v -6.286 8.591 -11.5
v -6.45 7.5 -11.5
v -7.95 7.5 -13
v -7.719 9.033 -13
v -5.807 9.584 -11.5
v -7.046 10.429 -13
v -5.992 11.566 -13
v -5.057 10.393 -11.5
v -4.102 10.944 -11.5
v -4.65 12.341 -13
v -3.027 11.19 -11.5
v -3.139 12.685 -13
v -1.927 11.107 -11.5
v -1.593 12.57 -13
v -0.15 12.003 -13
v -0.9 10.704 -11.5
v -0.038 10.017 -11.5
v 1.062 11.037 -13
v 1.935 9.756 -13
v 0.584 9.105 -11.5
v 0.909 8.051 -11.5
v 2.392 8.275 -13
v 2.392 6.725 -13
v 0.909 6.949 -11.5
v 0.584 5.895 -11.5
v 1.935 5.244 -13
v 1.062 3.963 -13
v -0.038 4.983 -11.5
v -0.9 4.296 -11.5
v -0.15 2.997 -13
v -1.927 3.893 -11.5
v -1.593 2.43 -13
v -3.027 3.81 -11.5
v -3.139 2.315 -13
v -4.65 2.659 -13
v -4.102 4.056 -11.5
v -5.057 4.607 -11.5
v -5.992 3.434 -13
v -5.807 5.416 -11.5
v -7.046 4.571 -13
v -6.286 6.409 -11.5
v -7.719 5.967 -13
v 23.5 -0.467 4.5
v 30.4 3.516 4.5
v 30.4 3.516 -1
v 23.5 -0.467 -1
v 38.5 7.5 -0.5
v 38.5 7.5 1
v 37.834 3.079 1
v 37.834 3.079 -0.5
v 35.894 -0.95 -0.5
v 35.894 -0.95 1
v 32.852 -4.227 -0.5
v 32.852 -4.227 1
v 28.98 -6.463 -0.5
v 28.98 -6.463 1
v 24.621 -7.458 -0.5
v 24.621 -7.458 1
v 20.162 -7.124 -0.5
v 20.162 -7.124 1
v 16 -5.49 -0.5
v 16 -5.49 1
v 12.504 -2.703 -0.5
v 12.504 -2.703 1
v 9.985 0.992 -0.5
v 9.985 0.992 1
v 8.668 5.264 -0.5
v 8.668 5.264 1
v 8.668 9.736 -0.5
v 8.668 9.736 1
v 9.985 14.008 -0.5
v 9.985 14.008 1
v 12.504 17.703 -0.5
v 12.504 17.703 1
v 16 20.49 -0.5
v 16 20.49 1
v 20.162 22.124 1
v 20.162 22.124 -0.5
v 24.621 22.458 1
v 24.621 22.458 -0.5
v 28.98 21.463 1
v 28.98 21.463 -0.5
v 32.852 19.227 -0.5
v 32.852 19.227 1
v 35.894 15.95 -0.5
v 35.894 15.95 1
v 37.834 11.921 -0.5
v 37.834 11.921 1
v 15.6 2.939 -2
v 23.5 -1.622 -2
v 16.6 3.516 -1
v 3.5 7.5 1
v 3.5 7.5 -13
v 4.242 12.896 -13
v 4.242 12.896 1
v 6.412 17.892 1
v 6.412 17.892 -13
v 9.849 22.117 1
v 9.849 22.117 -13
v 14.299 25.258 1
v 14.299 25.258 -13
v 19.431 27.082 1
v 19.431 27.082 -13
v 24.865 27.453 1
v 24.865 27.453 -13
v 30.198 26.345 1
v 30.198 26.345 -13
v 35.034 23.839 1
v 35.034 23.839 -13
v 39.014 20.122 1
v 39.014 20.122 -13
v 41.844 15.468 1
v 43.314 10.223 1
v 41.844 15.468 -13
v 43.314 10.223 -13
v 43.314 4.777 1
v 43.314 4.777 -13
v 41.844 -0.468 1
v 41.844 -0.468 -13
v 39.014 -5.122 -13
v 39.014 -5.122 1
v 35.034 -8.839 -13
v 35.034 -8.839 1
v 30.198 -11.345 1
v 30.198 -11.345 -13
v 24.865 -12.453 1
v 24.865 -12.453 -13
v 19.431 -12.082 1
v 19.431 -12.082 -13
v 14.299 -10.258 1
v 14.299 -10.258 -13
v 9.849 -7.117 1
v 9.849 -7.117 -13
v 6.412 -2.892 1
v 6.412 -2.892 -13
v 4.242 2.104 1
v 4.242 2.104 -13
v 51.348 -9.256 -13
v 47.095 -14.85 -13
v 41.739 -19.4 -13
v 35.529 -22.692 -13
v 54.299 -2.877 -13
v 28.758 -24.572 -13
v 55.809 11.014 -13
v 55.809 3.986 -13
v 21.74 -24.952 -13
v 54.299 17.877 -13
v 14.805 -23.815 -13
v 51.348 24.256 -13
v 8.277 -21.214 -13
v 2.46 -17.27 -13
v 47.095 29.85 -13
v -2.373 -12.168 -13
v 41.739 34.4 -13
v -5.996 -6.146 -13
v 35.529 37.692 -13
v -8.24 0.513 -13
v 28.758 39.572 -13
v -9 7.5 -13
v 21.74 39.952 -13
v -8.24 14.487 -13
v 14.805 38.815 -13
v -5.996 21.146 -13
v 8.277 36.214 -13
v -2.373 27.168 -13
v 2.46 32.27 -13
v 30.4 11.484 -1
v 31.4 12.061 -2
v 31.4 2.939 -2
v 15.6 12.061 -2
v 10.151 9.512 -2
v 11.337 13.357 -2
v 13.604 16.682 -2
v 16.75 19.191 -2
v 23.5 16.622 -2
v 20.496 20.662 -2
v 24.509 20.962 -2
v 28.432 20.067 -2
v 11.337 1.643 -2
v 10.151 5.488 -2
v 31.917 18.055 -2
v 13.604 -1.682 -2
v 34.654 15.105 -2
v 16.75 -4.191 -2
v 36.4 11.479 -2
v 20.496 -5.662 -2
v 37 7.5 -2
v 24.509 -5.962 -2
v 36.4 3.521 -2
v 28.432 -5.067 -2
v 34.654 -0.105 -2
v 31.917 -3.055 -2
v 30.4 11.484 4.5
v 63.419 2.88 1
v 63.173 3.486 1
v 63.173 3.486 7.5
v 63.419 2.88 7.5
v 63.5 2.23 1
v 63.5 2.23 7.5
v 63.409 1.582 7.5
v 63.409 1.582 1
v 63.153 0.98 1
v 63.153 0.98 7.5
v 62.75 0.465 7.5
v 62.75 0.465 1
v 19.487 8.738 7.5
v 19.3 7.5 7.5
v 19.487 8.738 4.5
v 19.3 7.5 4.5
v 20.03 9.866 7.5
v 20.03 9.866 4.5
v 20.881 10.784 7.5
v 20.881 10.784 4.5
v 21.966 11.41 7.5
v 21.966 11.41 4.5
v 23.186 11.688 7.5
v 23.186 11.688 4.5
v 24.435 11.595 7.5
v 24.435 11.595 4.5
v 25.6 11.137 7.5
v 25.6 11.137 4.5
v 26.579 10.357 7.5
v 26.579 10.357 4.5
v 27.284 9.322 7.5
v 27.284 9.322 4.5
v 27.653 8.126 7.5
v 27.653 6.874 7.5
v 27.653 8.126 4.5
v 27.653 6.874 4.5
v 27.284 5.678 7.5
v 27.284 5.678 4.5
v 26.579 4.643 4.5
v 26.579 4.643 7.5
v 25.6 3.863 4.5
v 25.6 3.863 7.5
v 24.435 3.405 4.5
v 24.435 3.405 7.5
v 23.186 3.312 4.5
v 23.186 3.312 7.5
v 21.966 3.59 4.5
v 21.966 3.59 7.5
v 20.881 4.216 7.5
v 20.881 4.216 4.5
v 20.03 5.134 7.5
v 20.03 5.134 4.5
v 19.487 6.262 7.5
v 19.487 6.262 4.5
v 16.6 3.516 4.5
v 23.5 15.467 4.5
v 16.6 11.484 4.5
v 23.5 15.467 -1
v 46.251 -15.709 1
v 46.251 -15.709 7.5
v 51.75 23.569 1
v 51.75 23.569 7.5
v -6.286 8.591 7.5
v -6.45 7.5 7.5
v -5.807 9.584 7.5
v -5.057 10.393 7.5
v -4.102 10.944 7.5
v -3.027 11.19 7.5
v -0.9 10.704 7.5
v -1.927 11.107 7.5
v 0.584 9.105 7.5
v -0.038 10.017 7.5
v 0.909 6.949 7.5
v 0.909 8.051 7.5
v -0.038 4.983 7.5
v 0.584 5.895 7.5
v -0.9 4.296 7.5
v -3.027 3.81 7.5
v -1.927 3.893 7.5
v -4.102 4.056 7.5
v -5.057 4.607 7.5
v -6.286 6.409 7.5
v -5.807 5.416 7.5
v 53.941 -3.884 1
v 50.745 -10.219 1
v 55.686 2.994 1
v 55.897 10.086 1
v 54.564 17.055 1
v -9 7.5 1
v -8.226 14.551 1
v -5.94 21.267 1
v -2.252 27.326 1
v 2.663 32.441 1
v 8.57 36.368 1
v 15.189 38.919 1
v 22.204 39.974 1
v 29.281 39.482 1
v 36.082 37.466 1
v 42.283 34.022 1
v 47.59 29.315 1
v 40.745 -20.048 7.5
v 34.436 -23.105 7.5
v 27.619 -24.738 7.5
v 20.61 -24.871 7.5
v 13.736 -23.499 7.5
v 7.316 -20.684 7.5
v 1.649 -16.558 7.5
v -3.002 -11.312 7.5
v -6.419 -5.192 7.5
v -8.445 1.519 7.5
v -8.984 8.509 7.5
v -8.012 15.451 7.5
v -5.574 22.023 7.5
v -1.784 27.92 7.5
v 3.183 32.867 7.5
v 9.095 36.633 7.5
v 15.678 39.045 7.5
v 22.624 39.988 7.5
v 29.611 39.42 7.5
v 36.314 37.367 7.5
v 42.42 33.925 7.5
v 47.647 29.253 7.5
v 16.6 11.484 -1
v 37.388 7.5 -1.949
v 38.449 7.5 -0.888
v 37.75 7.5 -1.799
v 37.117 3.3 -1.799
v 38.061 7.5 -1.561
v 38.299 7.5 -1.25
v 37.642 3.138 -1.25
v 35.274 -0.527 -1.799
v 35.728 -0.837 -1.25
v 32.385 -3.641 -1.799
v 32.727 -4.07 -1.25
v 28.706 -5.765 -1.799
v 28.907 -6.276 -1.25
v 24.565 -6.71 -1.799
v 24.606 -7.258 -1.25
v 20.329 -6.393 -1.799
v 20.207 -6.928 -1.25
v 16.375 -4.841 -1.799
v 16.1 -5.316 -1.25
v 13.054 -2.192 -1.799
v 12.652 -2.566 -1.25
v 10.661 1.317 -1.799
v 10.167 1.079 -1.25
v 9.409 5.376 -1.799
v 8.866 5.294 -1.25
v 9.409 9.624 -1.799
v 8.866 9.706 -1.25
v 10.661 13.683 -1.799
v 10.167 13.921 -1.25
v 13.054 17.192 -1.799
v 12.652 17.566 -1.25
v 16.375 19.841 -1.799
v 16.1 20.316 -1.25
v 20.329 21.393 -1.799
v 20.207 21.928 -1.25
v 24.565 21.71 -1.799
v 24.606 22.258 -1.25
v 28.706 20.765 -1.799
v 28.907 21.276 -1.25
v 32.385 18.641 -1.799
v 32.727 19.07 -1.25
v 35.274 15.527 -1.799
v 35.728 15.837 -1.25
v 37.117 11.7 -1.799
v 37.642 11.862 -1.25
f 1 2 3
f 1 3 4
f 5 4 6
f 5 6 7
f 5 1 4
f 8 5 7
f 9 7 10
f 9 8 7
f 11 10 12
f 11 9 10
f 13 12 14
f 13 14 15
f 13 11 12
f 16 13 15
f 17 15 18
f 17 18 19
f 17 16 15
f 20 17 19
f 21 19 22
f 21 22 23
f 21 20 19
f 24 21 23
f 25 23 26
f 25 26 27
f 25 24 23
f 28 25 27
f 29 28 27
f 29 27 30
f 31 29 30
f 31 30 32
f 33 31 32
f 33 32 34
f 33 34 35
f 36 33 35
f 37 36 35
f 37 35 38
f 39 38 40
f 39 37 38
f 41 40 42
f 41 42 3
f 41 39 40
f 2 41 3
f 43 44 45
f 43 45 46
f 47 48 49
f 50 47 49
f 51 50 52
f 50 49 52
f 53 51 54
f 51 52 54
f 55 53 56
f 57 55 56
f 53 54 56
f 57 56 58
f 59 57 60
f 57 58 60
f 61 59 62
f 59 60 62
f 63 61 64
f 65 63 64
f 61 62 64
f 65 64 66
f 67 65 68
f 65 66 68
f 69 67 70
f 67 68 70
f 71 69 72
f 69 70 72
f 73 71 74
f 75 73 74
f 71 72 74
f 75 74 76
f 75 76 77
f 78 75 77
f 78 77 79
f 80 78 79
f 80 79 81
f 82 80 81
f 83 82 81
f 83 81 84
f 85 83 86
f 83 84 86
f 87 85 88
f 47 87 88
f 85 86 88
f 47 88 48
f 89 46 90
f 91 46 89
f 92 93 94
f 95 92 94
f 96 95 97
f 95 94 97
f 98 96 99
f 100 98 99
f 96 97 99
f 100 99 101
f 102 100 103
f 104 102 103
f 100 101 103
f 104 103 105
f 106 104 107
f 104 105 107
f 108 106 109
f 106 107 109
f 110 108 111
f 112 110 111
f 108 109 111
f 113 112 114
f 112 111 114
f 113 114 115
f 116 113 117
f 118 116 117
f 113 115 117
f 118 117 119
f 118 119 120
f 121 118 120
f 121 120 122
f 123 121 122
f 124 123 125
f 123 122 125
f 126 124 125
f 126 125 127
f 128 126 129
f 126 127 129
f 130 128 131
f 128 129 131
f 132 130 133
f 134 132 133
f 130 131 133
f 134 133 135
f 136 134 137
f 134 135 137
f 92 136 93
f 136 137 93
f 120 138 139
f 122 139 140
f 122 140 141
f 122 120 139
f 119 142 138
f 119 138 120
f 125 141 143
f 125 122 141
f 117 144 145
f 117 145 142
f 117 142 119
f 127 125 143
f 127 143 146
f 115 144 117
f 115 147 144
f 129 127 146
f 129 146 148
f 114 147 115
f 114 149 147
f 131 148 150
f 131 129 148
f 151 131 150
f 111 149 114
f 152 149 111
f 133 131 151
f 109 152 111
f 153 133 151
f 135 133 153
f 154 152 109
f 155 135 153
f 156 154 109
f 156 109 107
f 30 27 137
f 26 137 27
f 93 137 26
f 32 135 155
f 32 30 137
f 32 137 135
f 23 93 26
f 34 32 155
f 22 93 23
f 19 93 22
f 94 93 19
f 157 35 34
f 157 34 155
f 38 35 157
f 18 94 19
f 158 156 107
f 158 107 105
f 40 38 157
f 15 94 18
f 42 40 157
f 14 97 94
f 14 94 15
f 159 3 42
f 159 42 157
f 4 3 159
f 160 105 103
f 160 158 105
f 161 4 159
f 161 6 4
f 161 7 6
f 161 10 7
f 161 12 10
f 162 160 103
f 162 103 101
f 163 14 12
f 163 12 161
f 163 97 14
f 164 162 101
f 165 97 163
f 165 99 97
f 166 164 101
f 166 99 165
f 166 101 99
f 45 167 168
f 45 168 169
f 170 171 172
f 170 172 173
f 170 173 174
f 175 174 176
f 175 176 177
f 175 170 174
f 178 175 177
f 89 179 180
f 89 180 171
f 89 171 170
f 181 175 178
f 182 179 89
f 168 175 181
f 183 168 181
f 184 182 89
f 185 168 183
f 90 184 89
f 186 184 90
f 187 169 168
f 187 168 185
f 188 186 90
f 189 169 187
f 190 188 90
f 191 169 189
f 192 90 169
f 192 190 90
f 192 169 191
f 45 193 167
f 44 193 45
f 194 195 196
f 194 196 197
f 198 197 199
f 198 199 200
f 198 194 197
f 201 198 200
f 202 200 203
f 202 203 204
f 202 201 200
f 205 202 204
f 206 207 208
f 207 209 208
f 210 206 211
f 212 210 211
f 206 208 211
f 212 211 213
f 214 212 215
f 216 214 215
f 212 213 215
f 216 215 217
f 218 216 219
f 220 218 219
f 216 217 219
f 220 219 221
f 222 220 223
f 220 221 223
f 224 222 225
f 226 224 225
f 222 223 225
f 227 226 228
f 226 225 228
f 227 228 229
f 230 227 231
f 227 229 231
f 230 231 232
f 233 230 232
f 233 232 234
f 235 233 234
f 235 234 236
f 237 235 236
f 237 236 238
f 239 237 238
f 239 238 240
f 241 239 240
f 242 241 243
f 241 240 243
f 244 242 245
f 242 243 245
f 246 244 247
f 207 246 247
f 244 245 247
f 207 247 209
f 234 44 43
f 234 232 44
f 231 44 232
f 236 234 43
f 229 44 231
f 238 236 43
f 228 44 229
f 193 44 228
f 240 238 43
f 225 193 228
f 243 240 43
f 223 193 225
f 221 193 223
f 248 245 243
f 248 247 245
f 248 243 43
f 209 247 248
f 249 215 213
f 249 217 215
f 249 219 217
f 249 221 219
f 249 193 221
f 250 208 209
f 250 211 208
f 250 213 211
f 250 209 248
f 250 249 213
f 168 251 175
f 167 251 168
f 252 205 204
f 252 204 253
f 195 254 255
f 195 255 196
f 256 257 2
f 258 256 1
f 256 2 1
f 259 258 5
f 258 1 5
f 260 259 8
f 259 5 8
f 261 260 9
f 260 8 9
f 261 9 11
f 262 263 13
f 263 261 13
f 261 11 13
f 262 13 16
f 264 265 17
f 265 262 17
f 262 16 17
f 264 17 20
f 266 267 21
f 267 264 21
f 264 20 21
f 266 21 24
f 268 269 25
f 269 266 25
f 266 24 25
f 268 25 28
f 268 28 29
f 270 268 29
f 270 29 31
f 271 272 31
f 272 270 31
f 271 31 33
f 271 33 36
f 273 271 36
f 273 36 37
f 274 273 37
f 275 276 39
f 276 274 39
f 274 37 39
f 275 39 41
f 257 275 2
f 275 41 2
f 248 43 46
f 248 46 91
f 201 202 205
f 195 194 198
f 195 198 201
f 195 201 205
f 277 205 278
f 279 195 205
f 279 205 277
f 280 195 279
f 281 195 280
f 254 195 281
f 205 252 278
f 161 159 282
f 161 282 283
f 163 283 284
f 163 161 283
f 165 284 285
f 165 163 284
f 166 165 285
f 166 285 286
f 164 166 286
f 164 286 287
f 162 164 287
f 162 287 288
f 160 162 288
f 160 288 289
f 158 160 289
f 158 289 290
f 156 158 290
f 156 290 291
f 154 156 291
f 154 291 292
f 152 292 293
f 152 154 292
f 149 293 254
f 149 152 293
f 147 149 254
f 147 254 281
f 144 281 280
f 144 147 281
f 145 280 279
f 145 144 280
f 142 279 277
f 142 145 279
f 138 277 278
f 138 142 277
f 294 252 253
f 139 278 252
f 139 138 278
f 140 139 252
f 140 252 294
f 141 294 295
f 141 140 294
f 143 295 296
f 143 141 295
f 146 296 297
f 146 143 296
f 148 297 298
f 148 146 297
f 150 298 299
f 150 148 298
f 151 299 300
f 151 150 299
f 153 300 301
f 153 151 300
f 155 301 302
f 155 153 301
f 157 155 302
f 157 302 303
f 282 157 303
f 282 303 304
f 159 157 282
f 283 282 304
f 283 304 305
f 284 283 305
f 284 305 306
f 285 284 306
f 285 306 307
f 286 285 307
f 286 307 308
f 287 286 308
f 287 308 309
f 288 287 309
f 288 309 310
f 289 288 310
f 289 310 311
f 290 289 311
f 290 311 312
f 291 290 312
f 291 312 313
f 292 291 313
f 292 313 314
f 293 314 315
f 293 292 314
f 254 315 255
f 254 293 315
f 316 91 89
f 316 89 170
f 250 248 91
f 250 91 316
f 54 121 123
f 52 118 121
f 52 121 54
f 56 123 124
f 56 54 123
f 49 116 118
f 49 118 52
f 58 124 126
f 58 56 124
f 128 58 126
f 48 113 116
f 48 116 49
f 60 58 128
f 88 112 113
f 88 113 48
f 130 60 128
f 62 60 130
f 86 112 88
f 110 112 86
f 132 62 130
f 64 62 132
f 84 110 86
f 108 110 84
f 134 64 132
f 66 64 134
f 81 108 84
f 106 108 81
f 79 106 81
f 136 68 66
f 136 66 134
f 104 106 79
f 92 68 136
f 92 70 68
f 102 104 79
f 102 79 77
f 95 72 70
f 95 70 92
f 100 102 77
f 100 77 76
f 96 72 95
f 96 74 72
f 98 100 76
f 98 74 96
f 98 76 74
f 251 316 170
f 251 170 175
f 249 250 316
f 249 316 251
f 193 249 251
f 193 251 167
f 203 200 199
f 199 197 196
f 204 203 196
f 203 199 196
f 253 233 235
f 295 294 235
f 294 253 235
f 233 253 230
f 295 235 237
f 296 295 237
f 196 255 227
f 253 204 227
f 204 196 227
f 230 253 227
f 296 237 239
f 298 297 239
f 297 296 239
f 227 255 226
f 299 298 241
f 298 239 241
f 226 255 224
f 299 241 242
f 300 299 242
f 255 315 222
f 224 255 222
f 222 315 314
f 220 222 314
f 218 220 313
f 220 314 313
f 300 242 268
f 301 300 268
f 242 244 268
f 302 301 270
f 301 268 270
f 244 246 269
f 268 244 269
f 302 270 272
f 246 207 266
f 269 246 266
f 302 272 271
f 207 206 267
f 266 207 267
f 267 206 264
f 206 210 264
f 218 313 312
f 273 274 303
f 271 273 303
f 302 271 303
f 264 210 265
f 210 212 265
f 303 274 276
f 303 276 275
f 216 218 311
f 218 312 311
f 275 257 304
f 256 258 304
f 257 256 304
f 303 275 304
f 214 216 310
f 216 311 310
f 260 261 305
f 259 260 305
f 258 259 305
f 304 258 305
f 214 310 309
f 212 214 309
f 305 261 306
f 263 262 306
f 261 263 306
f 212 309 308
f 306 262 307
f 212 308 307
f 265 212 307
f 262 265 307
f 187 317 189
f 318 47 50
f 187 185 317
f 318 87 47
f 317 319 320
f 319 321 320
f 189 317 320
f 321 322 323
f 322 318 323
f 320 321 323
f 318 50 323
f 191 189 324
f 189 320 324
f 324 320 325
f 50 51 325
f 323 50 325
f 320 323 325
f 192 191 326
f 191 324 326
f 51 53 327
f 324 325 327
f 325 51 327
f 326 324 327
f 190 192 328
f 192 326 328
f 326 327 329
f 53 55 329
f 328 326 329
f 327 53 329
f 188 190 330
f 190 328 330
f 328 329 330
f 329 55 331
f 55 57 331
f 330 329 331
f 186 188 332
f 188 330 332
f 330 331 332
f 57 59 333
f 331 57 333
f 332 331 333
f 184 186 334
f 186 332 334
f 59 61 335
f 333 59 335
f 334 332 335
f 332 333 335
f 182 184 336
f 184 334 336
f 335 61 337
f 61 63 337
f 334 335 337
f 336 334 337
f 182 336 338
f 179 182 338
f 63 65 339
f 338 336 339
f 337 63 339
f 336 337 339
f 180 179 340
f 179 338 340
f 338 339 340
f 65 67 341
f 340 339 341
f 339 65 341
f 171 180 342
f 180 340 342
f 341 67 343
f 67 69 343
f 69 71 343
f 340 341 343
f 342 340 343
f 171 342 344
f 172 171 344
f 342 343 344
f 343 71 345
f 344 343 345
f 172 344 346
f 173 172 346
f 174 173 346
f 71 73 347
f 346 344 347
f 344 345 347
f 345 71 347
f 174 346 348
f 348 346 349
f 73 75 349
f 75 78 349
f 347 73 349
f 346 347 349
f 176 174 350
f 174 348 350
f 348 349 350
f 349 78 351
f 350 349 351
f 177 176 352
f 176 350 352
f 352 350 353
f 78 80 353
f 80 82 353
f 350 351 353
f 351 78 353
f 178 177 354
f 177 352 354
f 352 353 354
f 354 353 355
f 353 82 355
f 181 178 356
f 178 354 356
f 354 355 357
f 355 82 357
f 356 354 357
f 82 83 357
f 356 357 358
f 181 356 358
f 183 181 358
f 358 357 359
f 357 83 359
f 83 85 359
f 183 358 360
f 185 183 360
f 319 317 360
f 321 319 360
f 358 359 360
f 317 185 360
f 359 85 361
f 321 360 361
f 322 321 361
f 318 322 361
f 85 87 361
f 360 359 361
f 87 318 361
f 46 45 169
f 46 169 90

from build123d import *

# Parameters (mm, degrees)
SKETCH2_R               = 32.5
BOSS_EXTRUDE1_DEPTH     = 6
SKETCH3_R               = 32.5
BOSS_EXTRUDE2_DEPTH     = 2
CHAMFER1_SIZE           = 2
CUT_EXTRUDE1_DEPTH      = 6.5
SKETCH5_R               = 4.2
CUT_EXTRUDE2_DEPTH      = 70.12488698
CUT_EXTRUDE3_DEPTH      = 70.079664157
SKETCH8_R               = 15
BOSS_EXTRUDE3_DEPTH     = 3
BOSS_EXTRUDE4_START     = 3
SKETCH9_R               = 4.2
BOSS_EXTRUDE4_DEPTH     = 3
CUT_EXTRUDE5_START      = -3
SKETCH10_R              = 32.5
CUT_EXTRUDE5_DEPTH      = 3
FILLET1_R               = 1.5
SKETCH11_R              = 32.5
BOSS_EXTRUDE5_DEPTH     = 1.5
SKETCH12_R              = 4.2
CUT_EXTRUDE6_DEPTH      = 70.282032303
CHAMFER2_SIZE           = 1
BOSS_EXTRUDE6_DEPTH     = 6.5
BOSS_EXTRUDE8_START     = -6.5
BOSS_EXTRUDE8_DEPTH     = 6.5
BOSS_EXTRUDE10_START    = 14
SKETCH16_R              = 32.5
SKETCH16_R_2            = 20
SKETCH16_R_3            = 3.7
BOSS_EXTRUDE10_DEPTH    = 14
CHAMFER3_SIZE           = 1.5
CUT_EXTRUDE7_DEPTH      = 77.342976101
CUT_EXTRUDE7_DEPTH_BACK = 77.342976101
SKETCH17_R              = 3.7


with BuildPart() as part:
    # Sketch2 → Boss-Extrude1 (new body)
    with BuildSketch(Plane.XY.offset(1)):
        with Locations((23.5, 7.5)):
            Circle(SKETCH2_R)
        with BuildLine():
            Line((-3.5, 0), (-3.5, 15))
            ThreePointArc((-3.5, 15), (0, 18.5), (3.5, 15))
            Line((3.5, 15), (3.5, 0))
            ThreePointArc((3.5, 0), (0, -3.5), (-3.5, 0))
        make_face(mode=Mode.SUBTRACT)
    extrude(amount=BOSS_EXTRUDE1_DEPTH)

    # Sketch3 → Boss-Extrude2 (add)
    with BuildSketch(Plane.XY.offset(7)):
        with Locations((23.5, 7.5)):
            Circle(SKETCH3_R)
    extrude(amount=BOSS_EXTRUDE2_DEPTH)

    # Chamfer1
    chamfer1_edges = [part.edges().sort_by_distance(p)[0] for p in [
        (-3.5, 7.5, 1),
        (0, -3.5, 1),
        (3.5, 7.5, 1),
        (0, 18.5, 1),
    ]]
    chamfer(chamfer1_edges, length=CHAMFER1_SIZE)

    # Sketch4 → Cut-Extrude1 (cut)
    with BuildSketch(Plane(origin=(0, 0, 1), x_dir=(-1, 0, 0), z_dir=(0, 0, -1))):
        Polygon((-23.5, 15.467433715), (-30.4, 11.483716857), (-30.4, 3.516283143), (-23.5, -0.467433715), (-16.6, 3.516283143), (-16.6, 11.483716857), align=None)
    extrude(amount=-CUT_EXTRUDE1_DEPTH, mode=Mode.SUBTRACT)

    # Sketch5 → Cut-Extrude2 (cut, through all)
    with BuildSketch(Plane(origin=(0, 0, 7.5), x_dir=(-1, 0, 0), z_dir=(0, 0, -1))):
        with Locations((-23.5, 7.5)):
            Circle(SKETCH5_R)
    extrude(amount=-CUT_EXTRUDE2_DEPTH, mode=Mode.SUBTRACT)

    # Sketch6 → Cut-Extrude3 (cut, through all)
    with BuildSketch(Plane(origin=(0, 0, 7), x_dir=(-1, 0, 0), z_dir=(0, 0, -1))):
        with BuildLine():
            Line((-3.5, 15), (-3.5, 0))
            ThreePointArc((-3.5, 0), (0, -3.5), (3.5, 0))
            Line((3.5, 0), (3.5, 15))
            ThreePointArc((3.5, 15), (0, 18.5), (-3.5, 15))
        make_face()
    extrude(amount=-CUT_EXTRUDE3_DEPTH, mode=Mode.SUBTRACT)

    # Sketch8 → Boss-Extrude3 (add)
    with BuildSketch(Plane(origin=(0, 0, 1), x_dir=(-1, 0, 0), z_dir=(0, 0, -1))):
        with Locations(Location((-23.5, 7.5, 0), (0, 0, 180))):
            Circle(SKETCH8_R)
        Polygon((-16.6, 3.516283143), (-16.6, 11.483716857), (-23.5, 15.467433715), (-30.4, 11.483716857), (-30.4, 3.516283143), (-23.5, -0.467433715), align=None, mode=Mode.SUBTRACT)
    extrude(amount=BOSS_EXTRUDE3_DEPTH)

    # Sketch9 → Boss-Extrude4 (add)
    with BuildSketch(Plane(origin=(0, 0, 7.5), x_dir=(-1, 0, 0), z_dir=(0, 0, -1)).offset(BOSS_EXTRUDE4_START)):
        Polygon((-16.6, 11.483716857), (-23.5, 15.467433715), (-30.4, 11.483716857), (-30.4, 3.516283143), (-23.5, -0.467433715), (-16.6, 3.516283143), align=None)
        with Locations((-23.5, 7.5)):
            Circle(SKETCH9_R, mode=Mode.SUBTRACT)
    extrude(amount=-BOSS_EXTRUDE4_DEPTH)

    # Sketch10 → Cut-Extrude5 (cut)
    with BuildSketch(Plane.XY.offset(9).offset(CUT_EXTRUDE5_START)):
        with Locations((23.5, 7.5)):
            Circle(SKETCH10_R)
    extrude(amount=CUT_EXTRUDE5_DEPTH, mode=Mode.SUBTRACT)

    # Fillet1
    fillet1_edges = [part.edges().sort_by_distance(p)[0] for p in [
        (8.5, 7.5, -2),
    ]]
    fillet(fillet1_edges, radius=FILLET1_R)

    # Sketch11 → Boss-Extrude5 (add)
    with BuildSketch(Plane.XY.offset(6)):
        with Locations((23.5, 7.5)):
            Circle(SKETCH11_R)
        with BuildLine():
            Line((3.5, 15), (3.5, 0))
            ThreePointArc((3.5, 0), (0, -3.5), (-3.5, 0))
            Line((-3.5, 0), (-3.5, 15))
            ThreePointArc((-3.5, 15), (0, 18.5), (3.5, 15))
        make_face(mode=Mode.SUBTRACT)
    extrude(amount=BOSS_EXTRUDE5_DEPTH)

    # Sketch12 → Cut-Extrude6 (cut, through all)
    with BuildSketch(Plane(origin=(0, 0, 6), x_dir=(-1, 0, 0), z_dir=(0, 0, -1))):
        with Locations((-23.5, 7.5)):
            Circle(SKETCH12_R)
    extrude(amount=-CUT_EXTRUDE6_DEPTH, mode=Mode.SUBTRACT)

    # Chamfer2
    chamfer2_edges = [part.edges().sort_by_distance(p)[0] for p in [
        (20.05, 1.524424714, -2),
        (16.6, 7.5, -2),
        (20.05, 13.475575286, -2),
        (26.95, 13.475575286, -2),
        (30.4, 7.5, -2),
        (26.95, 1.524424714, -2),
    ]]
    chamfer(chamfer2_edges, length=CHAMFER2_SIZE)

    # Sketch13 → Boss-Extrude6 (add)
    with BuildSketch(Plane(origin=(0, 0, 1), x_dir=(-1, 0, 0), z_dir=(0, 0, -1))):
        with BuildLine():
            Line((-51.749638846, 23.568848902), (-63.173049142, 3.4860653))
            ThreePointArc((-63.173049142, 3.4860653), (-63.475854367, 1.903380389), (-62.750057959, 0.464699706))
            Line((-62.750057959, 0.464699706), (-46.250753464, -15.708903826))
            ThreePointArc((-46.250753464, -15.708903826), (-55.686106767, 2.993945053), (-51.749638846, 23.568848902))
        make_face()
    extrude(amount=-BOSS_EXTRUDE6_DEPTH)

    # Sketch15 → Boss-Extrude8 (add)
    with BuildSketch(Plane.XY.offset(7.5).offset(BOSS_EXTRUDE8_START)):
        with BuildLine():
            Line((46.250753464, -15.708903826), (62.750057959, 0.464699706))
            ThreePointArc((62.750057959, 0.464699706), (63.475854367, 1.903380389), (63.173049142, 3.4860653))
            Line((63.173049142, 3.4860653), (51.749638846, 23.568848902))
            ThreePointArc((51.749638846, 23.568848902), (-8.686106767, 12.006054947), (46.250753464, -15.708903826))
        make_face()
        Polygon((23.5, -0.467433715), (16.6, 3.516283143), (16.6, 11.483716857), (23.5, 15.467433715), (30.4, 11.483716857), (30.4, 3.516283143), align=None, mode=Mode.SUBTRACT)
    extrude(amount=BOSS_EXTRUDE8_DEPTH)

    # Sketch16 → Boss-Extrude10 (add)
    with BuildSketch(Plane(origin=(0, 0, 1), x_dir=(-1, 0, 0), z_dir=(0, 0, -1)).offset(BOSS_EXTRUDE10_START)):
        with Locations((-23.5, 7.5)):
            Circle(SKETCH16_R)
        with Locations((-23.5, 7.5)):
            Circle(SKETCH16_R_2, mode=Mode.SUBTRACT)
        with Locations((2.75, 7.5)):
            Circle(SKETCH16_R_3, mode=Mode.SUBTRACT)
    extrude(amount=-BOSS_EXTRUDE10_DEPTH)

    # Chamfer3
    chamfer3_edges = [part.edges().sort_by_distance(p)[0] for p in [
        (0.95, 7.5, -13),
    ]]
    chamfer(chamfer3_edges, length=CHAMFER3_SIZE)

    # Sketch17 → Cut-Extrude7 (cut, two sides: drawn at the far end of the back side and taken through both)
    with BuildSketch(Plane(origin=(0, 0, 1), x_dir=(-1, 0, 0), z_dir=(0, 0, -1)).offset(-CUT_EXTRUDE7_DEPTH_BACK)):
        with Locations((2.75, 7.5)):
            Circle(SKETCH17_R)
    extrude(amount=CUT_EXTRUDE7_DEPTH + CUT_EXTRUDE7_DEPTH_BACK, mode=Mode.SUBTRACT)


solid = part.part
